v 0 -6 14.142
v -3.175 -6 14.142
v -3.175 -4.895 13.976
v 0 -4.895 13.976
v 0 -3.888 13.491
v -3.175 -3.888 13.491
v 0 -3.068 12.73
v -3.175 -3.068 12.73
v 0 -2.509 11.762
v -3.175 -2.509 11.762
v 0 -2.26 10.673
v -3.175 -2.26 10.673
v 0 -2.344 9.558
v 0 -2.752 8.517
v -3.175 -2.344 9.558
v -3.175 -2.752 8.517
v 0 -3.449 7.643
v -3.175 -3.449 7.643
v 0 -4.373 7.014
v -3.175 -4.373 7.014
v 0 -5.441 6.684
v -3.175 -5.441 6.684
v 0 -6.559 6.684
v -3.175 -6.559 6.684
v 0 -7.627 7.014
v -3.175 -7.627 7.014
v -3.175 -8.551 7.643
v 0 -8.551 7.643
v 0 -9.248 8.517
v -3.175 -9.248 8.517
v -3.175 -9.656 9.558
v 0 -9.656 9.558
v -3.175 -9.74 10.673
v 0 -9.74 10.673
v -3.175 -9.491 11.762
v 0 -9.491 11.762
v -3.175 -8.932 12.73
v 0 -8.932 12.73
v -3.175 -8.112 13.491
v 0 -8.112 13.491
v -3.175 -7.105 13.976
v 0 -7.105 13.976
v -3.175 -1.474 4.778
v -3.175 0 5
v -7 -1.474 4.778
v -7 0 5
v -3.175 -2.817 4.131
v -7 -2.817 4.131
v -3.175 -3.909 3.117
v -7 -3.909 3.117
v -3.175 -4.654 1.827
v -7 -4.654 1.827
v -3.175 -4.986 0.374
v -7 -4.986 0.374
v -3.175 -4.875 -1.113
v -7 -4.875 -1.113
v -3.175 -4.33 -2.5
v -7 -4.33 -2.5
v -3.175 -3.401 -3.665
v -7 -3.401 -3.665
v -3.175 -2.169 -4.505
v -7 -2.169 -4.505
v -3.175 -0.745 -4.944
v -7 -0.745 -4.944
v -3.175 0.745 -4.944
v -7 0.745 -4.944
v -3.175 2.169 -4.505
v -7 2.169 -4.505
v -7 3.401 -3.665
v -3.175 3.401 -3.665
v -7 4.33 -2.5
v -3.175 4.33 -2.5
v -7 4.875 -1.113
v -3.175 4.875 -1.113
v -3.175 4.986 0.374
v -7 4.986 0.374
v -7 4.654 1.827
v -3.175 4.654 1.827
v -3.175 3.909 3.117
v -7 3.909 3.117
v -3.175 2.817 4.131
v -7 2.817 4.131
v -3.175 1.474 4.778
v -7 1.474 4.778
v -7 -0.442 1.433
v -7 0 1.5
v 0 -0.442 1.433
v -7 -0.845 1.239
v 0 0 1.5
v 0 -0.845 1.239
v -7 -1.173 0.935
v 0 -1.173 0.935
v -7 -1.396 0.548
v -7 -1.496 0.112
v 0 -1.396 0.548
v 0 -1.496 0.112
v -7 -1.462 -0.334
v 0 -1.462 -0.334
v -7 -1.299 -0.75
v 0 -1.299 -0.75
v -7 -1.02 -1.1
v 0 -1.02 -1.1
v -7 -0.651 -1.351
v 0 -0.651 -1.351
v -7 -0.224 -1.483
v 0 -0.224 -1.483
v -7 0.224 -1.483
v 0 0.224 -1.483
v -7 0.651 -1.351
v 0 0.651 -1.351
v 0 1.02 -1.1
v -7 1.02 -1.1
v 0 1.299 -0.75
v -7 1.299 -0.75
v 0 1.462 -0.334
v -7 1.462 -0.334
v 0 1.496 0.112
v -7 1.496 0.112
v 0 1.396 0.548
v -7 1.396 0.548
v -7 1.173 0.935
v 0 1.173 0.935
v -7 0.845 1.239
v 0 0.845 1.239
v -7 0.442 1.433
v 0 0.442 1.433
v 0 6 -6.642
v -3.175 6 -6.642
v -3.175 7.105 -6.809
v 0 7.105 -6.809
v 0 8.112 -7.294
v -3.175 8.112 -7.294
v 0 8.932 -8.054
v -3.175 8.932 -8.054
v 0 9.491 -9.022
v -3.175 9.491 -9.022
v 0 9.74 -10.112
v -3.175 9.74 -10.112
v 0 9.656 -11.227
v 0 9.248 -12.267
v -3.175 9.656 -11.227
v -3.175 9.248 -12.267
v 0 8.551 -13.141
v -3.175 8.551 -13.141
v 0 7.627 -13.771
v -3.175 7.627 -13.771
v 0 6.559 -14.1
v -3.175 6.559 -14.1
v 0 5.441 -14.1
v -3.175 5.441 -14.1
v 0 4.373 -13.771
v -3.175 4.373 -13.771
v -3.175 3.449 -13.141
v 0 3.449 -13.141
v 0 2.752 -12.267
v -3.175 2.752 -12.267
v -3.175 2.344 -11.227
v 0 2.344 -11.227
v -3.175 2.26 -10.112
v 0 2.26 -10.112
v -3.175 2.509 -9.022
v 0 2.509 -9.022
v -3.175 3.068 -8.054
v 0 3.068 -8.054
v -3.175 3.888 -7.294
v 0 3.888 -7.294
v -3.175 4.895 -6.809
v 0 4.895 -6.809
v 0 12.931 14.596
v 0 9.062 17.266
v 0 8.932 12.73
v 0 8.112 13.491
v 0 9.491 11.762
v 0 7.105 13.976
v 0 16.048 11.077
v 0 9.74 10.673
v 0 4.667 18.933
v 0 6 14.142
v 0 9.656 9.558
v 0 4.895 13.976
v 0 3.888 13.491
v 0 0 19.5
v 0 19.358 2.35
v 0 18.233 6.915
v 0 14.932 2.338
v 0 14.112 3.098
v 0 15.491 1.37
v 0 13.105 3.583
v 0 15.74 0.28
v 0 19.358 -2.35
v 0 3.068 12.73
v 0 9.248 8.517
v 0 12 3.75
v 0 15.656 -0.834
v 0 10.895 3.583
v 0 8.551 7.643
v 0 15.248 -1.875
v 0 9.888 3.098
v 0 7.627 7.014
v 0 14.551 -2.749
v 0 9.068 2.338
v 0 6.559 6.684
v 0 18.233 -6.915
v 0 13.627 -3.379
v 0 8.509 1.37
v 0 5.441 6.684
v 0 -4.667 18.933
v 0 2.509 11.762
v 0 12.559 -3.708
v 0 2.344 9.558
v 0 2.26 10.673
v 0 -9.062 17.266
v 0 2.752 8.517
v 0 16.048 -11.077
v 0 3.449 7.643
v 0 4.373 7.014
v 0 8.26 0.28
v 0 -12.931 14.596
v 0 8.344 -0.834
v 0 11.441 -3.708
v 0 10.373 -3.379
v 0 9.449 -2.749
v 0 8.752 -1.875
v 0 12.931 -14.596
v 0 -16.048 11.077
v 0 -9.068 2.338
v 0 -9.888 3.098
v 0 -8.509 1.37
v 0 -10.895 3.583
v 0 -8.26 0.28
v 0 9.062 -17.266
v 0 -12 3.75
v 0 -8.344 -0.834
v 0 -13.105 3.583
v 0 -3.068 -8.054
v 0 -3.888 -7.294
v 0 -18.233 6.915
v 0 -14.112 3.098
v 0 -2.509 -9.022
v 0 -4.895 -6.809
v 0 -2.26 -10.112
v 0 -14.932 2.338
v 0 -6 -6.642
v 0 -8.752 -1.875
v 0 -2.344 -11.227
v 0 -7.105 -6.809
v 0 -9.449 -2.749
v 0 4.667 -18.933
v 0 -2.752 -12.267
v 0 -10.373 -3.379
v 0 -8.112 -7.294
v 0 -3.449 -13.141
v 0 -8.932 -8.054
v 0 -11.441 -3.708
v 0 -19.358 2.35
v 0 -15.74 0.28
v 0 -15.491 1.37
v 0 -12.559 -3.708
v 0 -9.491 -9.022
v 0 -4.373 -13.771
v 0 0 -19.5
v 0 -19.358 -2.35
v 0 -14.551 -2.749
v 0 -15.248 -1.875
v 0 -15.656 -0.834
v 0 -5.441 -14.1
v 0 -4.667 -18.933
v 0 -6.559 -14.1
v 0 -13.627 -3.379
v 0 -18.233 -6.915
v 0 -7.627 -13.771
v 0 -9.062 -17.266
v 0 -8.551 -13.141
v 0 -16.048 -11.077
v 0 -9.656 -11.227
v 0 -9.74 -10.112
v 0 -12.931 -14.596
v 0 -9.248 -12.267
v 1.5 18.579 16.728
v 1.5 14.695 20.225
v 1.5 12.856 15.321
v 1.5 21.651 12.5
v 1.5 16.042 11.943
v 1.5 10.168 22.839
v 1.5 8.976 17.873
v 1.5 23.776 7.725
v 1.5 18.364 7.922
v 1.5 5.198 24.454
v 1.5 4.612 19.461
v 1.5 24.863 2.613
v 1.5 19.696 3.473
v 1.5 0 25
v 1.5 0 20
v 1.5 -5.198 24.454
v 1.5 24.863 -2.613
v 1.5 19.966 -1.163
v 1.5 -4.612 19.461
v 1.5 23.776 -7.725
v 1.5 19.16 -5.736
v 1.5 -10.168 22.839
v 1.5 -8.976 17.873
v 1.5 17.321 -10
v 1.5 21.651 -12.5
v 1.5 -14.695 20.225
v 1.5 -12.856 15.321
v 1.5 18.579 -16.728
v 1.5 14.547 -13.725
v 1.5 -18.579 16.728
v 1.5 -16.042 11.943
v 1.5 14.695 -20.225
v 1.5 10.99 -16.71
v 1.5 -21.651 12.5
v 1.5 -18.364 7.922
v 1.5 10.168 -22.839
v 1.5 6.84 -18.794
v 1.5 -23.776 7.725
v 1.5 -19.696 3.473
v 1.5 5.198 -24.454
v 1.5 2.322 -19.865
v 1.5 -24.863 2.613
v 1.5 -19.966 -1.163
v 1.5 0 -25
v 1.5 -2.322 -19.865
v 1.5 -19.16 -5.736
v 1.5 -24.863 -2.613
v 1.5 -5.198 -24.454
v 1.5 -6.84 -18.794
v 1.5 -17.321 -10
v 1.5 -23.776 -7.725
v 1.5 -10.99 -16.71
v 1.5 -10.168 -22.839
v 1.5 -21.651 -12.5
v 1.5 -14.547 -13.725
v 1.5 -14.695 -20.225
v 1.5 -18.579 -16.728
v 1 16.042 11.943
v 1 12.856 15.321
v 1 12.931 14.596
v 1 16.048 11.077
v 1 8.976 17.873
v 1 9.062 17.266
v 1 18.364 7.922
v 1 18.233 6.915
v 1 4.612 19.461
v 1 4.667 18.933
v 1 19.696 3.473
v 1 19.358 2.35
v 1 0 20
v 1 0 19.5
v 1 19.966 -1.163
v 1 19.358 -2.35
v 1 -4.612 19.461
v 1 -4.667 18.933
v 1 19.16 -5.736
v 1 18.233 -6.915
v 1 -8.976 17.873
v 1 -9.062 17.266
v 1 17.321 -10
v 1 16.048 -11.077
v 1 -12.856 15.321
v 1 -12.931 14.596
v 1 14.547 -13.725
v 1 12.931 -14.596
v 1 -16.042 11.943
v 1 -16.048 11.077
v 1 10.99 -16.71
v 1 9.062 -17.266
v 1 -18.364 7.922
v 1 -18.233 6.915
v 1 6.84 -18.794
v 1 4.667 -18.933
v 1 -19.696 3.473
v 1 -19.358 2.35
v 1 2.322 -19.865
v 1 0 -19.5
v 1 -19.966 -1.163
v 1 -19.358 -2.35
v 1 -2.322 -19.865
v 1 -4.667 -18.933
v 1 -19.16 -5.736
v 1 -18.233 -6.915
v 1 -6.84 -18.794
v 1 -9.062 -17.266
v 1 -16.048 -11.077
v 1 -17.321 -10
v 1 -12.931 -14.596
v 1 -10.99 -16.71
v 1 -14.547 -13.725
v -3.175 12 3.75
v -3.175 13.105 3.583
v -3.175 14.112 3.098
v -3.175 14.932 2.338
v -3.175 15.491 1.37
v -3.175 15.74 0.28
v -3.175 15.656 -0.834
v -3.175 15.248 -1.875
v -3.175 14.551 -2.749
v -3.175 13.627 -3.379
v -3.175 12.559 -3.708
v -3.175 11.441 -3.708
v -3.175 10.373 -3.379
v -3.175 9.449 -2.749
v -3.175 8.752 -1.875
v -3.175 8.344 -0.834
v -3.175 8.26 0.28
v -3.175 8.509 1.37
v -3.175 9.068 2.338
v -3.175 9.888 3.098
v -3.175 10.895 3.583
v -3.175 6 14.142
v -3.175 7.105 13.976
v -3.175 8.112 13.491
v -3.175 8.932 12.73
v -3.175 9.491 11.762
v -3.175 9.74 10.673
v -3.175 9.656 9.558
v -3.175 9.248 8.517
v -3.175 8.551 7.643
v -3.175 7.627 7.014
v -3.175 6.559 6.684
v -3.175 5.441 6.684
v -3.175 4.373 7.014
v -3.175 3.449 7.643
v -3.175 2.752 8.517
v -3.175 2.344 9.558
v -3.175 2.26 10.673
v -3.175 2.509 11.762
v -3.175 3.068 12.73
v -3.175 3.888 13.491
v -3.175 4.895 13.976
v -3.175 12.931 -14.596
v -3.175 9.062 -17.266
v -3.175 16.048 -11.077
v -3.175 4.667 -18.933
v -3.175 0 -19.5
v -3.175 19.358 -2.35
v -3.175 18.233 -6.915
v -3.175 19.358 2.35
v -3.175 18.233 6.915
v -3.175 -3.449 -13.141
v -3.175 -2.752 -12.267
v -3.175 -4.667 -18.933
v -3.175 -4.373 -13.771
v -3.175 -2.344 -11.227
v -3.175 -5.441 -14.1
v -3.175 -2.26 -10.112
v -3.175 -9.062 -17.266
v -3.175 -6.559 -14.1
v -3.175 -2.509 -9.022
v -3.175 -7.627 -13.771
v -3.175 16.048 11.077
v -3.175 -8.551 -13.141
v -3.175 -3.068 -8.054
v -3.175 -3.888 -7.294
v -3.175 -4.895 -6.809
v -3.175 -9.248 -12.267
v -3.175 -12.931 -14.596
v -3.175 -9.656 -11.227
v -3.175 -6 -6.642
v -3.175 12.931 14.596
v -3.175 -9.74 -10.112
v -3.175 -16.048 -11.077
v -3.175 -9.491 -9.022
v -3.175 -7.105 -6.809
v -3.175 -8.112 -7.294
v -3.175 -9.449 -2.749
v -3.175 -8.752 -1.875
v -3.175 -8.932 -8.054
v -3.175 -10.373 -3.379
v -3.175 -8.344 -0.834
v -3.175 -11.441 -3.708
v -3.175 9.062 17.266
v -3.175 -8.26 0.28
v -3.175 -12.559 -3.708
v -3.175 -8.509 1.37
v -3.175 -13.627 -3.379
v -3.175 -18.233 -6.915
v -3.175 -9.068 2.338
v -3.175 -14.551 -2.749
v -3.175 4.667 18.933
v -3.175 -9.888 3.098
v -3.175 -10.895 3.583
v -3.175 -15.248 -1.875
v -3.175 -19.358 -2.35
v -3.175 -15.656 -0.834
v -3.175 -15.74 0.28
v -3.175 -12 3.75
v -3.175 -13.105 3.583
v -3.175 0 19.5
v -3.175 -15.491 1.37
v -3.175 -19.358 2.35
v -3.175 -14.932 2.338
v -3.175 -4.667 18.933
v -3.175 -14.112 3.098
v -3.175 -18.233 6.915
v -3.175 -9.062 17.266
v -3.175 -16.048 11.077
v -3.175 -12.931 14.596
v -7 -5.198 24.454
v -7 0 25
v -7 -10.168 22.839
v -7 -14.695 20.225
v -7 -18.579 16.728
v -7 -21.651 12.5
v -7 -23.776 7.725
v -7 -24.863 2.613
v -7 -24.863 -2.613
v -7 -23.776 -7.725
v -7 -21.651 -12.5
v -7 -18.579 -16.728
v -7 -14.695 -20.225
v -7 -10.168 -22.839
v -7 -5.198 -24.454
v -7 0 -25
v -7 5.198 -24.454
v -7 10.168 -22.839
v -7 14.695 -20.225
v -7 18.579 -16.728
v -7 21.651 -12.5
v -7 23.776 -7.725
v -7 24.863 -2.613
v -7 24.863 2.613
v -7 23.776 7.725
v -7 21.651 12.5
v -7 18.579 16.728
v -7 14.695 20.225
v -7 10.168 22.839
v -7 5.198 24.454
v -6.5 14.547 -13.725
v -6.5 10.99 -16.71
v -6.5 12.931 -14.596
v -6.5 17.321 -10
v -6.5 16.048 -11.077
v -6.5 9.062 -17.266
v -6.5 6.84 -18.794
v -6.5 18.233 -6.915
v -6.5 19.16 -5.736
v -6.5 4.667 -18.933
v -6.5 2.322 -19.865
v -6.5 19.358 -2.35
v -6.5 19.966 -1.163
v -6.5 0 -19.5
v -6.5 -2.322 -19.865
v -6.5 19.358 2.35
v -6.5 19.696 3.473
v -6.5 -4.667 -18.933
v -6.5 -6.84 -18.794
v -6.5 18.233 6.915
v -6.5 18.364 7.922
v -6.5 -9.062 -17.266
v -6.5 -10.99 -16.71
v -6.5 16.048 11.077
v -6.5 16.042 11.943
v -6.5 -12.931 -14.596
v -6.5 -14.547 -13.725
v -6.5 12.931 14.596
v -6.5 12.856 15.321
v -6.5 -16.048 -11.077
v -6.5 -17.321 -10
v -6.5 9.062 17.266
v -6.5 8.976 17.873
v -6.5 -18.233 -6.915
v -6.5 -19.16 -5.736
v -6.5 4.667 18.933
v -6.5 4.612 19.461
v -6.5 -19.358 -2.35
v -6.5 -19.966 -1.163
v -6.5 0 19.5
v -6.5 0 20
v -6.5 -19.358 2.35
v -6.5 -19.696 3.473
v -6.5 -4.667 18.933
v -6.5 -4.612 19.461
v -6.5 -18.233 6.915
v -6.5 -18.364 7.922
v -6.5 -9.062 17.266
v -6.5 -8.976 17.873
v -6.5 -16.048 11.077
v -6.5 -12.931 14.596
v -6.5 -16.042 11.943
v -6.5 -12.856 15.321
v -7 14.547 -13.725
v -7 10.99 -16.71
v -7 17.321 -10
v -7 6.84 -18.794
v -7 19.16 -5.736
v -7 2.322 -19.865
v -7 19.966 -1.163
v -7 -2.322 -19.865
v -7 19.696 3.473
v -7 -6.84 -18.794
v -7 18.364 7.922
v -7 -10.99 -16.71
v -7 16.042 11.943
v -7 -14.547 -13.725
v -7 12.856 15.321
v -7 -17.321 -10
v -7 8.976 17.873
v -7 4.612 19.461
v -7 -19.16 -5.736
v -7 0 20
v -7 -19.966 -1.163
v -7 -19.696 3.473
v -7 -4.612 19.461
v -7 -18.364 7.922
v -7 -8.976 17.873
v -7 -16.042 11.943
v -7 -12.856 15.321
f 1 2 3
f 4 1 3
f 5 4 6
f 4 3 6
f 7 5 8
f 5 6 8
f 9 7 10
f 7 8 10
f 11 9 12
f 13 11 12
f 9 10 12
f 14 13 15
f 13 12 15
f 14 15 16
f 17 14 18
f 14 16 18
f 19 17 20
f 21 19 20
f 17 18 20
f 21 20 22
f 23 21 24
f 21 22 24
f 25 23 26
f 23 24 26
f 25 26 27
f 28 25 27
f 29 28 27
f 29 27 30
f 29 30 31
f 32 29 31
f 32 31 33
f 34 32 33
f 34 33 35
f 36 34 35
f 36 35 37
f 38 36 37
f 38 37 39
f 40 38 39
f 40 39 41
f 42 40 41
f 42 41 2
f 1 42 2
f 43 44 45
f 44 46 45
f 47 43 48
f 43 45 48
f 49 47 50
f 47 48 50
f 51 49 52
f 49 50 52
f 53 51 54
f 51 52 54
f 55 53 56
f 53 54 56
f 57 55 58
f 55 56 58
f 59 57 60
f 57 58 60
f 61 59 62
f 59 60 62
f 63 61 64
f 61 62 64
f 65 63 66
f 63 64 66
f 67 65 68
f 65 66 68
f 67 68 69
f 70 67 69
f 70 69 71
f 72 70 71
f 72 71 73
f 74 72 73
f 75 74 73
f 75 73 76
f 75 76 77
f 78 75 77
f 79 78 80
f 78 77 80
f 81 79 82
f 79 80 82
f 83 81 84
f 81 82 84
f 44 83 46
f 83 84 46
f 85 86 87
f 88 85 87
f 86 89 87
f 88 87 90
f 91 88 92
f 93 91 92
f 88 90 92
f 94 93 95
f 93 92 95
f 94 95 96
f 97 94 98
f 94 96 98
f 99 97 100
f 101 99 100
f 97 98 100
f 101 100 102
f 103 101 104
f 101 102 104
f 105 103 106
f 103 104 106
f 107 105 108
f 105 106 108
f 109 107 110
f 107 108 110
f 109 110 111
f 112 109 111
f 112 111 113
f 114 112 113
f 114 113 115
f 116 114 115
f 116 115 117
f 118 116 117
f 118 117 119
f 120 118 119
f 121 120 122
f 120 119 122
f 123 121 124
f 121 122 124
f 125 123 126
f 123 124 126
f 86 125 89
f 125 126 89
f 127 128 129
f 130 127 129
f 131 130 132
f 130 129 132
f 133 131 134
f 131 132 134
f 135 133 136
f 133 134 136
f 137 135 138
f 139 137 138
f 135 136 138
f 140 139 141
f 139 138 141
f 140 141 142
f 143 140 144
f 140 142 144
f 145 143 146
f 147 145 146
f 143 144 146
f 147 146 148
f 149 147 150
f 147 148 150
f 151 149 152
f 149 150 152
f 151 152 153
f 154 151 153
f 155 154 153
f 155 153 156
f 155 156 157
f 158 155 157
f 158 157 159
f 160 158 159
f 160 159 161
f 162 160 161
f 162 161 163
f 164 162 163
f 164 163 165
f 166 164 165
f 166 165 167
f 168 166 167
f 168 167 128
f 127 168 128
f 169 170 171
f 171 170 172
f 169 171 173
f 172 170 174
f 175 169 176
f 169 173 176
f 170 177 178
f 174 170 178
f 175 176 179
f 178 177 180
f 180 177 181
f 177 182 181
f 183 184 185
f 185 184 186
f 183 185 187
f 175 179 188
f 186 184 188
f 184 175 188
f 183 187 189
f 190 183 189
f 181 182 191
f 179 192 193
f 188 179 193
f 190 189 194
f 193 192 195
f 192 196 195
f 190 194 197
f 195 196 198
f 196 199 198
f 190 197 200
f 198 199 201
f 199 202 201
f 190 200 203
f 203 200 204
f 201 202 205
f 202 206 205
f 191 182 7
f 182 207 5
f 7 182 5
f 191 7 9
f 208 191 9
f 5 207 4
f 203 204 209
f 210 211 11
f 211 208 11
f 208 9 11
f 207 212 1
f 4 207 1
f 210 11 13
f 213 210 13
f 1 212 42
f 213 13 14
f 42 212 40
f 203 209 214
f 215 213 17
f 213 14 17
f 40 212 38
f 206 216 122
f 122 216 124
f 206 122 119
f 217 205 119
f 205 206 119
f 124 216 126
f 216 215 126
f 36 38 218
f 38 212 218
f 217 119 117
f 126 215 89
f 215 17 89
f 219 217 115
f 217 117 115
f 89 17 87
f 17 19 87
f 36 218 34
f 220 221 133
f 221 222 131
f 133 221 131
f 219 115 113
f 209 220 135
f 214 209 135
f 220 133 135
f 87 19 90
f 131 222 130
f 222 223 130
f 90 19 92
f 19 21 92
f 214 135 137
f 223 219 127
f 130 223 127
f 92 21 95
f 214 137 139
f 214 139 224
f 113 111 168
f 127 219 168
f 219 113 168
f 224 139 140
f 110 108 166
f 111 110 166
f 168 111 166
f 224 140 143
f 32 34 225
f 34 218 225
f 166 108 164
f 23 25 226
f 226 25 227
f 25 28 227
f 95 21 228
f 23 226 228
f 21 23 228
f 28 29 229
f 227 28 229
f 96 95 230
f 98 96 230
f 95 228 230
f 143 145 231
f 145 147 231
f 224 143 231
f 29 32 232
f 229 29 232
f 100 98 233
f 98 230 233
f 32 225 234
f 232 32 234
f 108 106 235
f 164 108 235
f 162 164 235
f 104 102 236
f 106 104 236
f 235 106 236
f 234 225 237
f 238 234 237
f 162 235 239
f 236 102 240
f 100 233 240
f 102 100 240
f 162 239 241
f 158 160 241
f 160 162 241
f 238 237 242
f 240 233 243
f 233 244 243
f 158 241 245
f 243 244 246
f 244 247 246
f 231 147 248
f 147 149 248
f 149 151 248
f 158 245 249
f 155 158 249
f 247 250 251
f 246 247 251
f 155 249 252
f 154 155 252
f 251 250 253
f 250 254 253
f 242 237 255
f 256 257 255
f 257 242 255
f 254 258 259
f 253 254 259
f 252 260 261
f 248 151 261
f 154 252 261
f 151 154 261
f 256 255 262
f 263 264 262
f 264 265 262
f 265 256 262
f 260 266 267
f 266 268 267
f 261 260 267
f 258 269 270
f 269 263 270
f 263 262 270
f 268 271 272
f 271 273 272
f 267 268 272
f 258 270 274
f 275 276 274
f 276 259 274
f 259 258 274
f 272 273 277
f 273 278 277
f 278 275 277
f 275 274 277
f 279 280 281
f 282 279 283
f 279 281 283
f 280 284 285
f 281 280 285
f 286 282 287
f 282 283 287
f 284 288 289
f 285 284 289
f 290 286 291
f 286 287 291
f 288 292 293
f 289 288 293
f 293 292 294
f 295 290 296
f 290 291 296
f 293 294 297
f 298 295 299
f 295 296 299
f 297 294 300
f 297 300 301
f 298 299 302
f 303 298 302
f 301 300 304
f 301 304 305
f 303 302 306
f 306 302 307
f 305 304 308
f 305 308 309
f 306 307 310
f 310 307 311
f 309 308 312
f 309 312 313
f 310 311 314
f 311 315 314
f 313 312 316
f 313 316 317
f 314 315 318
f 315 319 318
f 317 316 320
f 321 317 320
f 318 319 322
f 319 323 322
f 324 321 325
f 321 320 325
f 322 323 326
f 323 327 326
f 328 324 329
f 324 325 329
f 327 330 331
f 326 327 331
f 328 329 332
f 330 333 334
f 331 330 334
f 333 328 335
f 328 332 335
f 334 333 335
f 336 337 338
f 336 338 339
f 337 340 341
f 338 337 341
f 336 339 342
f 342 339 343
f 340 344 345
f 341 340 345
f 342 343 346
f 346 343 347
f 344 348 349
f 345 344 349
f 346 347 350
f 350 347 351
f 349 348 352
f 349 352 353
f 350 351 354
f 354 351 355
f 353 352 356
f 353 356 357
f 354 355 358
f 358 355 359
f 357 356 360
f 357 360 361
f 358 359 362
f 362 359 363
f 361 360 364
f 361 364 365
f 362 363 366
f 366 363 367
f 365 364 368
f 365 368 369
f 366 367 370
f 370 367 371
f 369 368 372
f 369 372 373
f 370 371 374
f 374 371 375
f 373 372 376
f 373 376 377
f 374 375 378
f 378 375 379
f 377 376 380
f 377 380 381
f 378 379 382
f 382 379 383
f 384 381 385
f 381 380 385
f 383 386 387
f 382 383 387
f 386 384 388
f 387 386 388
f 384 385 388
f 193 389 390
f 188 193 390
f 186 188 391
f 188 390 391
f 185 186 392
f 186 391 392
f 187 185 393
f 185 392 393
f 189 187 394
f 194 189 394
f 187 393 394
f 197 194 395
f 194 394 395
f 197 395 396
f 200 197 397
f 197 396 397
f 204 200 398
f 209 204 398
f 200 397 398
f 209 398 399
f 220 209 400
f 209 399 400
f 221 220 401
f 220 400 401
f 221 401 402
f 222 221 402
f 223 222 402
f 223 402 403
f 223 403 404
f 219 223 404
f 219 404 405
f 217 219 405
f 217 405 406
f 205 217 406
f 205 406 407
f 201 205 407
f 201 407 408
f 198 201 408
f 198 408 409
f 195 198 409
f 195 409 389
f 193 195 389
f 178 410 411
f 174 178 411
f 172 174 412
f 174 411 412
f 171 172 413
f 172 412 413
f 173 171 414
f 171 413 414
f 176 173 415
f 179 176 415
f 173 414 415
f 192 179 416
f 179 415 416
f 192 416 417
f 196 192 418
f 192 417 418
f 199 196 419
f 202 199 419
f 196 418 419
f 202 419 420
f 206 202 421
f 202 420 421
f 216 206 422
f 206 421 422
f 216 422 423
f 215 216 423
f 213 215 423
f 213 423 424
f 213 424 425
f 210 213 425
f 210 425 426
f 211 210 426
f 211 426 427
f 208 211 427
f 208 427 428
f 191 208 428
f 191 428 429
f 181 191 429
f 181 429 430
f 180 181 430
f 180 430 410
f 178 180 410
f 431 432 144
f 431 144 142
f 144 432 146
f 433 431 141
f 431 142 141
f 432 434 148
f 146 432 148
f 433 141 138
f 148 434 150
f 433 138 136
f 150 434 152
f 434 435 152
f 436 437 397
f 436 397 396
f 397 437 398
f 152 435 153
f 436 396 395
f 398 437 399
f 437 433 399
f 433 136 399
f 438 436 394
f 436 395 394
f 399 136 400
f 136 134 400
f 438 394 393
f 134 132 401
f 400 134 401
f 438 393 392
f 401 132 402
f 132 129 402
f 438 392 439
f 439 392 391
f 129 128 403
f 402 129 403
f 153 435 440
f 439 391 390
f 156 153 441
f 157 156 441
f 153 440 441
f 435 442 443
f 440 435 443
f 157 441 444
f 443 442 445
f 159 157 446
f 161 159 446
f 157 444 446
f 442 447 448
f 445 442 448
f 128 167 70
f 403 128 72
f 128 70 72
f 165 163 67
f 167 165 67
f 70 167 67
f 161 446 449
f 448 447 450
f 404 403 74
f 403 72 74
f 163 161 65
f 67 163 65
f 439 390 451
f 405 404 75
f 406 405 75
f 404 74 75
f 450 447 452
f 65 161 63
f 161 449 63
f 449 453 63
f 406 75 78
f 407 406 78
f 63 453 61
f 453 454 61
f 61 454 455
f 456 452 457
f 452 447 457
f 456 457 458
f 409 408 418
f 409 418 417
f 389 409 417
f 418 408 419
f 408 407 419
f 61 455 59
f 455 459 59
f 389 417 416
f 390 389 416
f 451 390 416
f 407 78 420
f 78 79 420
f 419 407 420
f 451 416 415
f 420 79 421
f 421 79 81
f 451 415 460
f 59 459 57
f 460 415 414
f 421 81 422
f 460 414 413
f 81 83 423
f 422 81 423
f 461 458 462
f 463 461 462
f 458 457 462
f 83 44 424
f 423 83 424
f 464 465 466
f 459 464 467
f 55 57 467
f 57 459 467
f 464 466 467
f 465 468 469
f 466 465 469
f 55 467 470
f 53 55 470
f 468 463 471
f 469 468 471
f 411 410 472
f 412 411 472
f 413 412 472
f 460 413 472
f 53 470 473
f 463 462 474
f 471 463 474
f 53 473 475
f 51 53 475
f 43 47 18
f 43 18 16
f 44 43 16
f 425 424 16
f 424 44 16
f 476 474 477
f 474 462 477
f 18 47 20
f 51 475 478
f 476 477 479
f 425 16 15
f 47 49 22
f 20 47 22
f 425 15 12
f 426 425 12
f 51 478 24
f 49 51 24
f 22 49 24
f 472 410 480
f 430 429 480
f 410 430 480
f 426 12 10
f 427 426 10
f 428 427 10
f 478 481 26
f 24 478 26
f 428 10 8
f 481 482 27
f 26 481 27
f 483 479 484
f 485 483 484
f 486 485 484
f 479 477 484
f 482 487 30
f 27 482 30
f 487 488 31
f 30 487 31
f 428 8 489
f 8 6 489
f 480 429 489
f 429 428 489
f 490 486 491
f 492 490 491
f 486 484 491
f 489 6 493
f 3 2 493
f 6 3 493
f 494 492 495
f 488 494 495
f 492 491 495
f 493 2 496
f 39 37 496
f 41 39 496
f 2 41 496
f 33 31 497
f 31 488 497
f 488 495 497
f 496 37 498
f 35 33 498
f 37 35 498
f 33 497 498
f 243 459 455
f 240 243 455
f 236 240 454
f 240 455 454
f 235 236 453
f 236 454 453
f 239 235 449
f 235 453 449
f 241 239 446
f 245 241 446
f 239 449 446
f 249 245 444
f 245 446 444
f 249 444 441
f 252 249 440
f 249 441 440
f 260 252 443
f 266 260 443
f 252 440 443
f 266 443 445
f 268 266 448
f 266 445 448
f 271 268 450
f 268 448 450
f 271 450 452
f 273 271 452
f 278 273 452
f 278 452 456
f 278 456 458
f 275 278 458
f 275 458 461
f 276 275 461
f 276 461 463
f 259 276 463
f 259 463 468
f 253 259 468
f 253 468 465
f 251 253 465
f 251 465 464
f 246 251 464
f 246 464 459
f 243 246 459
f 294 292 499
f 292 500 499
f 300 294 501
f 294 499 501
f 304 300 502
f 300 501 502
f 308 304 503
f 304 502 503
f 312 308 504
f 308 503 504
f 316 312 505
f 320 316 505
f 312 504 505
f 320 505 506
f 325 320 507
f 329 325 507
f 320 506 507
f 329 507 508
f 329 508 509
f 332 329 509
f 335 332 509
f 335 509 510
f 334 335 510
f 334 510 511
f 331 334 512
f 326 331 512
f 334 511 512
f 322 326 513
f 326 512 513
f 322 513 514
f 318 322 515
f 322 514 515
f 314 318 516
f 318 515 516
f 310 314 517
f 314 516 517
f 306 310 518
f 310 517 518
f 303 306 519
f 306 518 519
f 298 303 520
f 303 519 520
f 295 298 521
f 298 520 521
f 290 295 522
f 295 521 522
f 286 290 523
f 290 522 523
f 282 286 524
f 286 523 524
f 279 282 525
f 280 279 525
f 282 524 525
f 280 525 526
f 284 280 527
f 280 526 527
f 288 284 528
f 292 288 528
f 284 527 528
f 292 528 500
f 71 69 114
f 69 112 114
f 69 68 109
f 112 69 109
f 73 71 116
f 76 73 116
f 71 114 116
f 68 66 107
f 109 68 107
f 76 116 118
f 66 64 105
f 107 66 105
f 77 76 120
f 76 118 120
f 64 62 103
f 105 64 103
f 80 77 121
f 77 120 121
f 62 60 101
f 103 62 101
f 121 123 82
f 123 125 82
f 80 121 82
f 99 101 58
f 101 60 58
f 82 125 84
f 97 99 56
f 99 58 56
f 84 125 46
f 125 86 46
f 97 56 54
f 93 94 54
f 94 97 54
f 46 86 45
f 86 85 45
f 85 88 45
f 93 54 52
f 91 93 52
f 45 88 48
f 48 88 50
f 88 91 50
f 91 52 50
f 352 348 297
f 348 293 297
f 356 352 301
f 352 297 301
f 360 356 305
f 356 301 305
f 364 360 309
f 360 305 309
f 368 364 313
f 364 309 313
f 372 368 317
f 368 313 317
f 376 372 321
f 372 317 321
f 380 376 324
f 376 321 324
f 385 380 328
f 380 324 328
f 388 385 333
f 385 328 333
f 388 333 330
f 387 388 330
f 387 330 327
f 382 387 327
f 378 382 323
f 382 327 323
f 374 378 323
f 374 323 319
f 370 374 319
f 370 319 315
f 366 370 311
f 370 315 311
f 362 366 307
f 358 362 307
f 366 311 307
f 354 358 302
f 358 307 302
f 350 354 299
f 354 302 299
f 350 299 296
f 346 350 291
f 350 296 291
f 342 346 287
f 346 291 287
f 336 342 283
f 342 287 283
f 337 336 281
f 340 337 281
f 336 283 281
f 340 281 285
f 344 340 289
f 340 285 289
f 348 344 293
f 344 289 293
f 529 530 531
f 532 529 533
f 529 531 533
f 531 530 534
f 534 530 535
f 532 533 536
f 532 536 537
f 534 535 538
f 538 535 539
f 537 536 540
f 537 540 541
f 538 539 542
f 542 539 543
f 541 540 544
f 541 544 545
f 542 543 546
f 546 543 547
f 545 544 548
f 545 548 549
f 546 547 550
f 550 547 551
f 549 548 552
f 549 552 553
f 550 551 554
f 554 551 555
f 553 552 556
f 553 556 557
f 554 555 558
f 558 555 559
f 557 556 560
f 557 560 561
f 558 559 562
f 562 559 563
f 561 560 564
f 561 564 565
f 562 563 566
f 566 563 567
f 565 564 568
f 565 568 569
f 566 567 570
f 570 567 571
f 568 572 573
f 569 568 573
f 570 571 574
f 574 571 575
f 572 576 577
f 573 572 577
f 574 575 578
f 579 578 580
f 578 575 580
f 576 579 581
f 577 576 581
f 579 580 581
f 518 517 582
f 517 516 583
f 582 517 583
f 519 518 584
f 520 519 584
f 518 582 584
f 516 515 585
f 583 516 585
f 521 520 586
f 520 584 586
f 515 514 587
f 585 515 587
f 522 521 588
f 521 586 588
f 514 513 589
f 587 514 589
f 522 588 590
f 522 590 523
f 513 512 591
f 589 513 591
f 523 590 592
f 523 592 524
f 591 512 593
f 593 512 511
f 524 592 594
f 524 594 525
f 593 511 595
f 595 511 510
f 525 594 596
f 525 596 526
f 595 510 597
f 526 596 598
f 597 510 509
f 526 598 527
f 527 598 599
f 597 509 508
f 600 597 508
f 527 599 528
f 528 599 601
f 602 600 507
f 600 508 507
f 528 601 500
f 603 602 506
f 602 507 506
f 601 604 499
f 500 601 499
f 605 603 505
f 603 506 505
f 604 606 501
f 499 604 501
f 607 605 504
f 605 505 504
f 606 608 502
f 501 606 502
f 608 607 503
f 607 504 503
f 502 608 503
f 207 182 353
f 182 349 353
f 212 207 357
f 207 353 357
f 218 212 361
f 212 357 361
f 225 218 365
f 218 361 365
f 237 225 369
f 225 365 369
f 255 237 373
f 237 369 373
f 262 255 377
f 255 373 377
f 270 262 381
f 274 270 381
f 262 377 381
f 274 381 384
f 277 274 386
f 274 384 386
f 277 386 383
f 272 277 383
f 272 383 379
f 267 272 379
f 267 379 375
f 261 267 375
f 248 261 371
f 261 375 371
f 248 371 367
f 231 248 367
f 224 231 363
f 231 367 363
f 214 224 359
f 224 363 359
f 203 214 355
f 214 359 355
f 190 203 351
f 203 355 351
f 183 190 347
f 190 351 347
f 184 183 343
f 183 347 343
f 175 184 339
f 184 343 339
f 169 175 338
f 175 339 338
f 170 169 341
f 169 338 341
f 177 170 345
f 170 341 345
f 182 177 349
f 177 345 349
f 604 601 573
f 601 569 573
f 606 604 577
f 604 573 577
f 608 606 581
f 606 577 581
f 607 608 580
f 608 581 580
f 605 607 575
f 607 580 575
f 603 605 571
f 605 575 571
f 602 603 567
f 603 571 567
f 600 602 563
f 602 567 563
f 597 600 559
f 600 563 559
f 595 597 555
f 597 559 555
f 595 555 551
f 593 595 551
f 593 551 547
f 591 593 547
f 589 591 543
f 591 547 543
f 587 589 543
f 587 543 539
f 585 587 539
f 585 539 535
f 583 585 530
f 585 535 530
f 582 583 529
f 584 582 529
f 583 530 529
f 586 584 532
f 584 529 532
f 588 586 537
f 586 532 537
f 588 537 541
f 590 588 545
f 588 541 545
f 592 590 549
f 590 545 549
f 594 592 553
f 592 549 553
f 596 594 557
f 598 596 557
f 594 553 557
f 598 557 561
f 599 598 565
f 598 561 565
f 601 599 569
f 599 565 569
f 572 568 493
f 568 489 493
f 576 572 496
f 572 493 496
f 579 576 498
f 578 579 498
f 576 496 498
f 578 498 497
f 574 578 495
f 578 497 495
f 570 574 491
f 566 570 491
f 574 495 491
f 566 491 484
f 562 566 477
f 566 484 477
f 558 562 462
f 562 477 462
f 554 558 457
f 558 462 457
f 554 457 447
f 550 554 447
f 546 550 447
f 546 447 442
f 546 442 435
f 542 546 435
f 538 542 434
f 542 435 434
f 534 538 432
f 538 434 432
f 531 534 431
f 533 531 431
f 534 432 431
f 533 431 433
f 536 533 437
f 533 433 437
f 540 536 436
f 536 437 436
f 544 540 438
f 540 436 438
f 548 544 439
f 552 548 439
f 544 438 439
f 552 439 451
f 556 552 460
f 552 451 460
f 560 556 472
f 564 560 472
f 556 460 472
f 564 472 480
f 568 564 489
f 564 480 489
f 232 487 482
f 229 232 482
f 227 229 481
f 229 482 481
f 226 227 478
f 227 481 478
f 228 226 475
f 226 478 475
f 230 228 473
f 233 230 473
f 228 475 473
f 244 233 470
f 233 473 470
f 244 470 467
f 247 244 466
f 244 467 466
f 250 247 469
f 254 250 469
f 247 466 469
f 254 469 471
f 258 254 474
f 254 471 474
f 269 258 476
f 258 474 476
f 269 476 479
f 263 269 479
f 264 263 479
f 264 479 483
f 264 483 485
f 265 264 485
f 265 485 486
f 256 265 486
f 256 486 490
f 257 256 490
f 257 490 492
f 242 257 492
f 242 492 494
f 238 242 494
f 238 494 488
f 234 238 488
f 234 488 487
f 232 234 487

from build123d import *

# Parameters (mm, degrees)
SKETCH2_R          = 3.75
CUT_EXTRUDE1_DEPTH = 10


with BuildPart() as part:
    # Sketch1 → Revolve1 (revolve)
    with BuildSketch(Plane.XY, mode=Mode.PRIVATE) as revolve1_sk:
        Polygon((0, 1.5), (0, 19.5), (1, 19.5), (1, 20), (1.5, 20), (1.5, 25), (-7, 25), (-7, 20), (-6.5, 20), (-6.5, 19.5), (-3.175, 19.5), (-3.175, 5), (-7, 5), (-7, 1.5), (-3.175, 1.5), align=None)
    revolve(revolve1_sk.sketch.rotate(Axis((-3.175, 0, 0), (1, 0, 0)), 90), axis=Axis((-3.175, 0, 0), (1, 0, 0)))

    # Sketch2 → Cut-Extrude1 (cut)
    with BuildSketch(Plane.ZY.offset(3.175)):
        with Locations((0, 12)):
            Circle(SKETCH2_R)
        with Locations((10.392304845, 6)):
            Circle(SKETCH2_R)
        with Locations((10.392304845, -6)):
            Circle(SKETCH2_R)
        with Locations((0, -12)):
            Circle(SKETCH2_R)
        with Locations((-10.392304845, -6)):
            Circle(SKETCH2_R)
        with Locations((-10.392304845, 6)):
            Circle(SKETCH2_R)
    extrude(amount=-CUT_EXTRUDE1_DEPTH, mode=Mode.SUBTRACT)


solid = part.part
